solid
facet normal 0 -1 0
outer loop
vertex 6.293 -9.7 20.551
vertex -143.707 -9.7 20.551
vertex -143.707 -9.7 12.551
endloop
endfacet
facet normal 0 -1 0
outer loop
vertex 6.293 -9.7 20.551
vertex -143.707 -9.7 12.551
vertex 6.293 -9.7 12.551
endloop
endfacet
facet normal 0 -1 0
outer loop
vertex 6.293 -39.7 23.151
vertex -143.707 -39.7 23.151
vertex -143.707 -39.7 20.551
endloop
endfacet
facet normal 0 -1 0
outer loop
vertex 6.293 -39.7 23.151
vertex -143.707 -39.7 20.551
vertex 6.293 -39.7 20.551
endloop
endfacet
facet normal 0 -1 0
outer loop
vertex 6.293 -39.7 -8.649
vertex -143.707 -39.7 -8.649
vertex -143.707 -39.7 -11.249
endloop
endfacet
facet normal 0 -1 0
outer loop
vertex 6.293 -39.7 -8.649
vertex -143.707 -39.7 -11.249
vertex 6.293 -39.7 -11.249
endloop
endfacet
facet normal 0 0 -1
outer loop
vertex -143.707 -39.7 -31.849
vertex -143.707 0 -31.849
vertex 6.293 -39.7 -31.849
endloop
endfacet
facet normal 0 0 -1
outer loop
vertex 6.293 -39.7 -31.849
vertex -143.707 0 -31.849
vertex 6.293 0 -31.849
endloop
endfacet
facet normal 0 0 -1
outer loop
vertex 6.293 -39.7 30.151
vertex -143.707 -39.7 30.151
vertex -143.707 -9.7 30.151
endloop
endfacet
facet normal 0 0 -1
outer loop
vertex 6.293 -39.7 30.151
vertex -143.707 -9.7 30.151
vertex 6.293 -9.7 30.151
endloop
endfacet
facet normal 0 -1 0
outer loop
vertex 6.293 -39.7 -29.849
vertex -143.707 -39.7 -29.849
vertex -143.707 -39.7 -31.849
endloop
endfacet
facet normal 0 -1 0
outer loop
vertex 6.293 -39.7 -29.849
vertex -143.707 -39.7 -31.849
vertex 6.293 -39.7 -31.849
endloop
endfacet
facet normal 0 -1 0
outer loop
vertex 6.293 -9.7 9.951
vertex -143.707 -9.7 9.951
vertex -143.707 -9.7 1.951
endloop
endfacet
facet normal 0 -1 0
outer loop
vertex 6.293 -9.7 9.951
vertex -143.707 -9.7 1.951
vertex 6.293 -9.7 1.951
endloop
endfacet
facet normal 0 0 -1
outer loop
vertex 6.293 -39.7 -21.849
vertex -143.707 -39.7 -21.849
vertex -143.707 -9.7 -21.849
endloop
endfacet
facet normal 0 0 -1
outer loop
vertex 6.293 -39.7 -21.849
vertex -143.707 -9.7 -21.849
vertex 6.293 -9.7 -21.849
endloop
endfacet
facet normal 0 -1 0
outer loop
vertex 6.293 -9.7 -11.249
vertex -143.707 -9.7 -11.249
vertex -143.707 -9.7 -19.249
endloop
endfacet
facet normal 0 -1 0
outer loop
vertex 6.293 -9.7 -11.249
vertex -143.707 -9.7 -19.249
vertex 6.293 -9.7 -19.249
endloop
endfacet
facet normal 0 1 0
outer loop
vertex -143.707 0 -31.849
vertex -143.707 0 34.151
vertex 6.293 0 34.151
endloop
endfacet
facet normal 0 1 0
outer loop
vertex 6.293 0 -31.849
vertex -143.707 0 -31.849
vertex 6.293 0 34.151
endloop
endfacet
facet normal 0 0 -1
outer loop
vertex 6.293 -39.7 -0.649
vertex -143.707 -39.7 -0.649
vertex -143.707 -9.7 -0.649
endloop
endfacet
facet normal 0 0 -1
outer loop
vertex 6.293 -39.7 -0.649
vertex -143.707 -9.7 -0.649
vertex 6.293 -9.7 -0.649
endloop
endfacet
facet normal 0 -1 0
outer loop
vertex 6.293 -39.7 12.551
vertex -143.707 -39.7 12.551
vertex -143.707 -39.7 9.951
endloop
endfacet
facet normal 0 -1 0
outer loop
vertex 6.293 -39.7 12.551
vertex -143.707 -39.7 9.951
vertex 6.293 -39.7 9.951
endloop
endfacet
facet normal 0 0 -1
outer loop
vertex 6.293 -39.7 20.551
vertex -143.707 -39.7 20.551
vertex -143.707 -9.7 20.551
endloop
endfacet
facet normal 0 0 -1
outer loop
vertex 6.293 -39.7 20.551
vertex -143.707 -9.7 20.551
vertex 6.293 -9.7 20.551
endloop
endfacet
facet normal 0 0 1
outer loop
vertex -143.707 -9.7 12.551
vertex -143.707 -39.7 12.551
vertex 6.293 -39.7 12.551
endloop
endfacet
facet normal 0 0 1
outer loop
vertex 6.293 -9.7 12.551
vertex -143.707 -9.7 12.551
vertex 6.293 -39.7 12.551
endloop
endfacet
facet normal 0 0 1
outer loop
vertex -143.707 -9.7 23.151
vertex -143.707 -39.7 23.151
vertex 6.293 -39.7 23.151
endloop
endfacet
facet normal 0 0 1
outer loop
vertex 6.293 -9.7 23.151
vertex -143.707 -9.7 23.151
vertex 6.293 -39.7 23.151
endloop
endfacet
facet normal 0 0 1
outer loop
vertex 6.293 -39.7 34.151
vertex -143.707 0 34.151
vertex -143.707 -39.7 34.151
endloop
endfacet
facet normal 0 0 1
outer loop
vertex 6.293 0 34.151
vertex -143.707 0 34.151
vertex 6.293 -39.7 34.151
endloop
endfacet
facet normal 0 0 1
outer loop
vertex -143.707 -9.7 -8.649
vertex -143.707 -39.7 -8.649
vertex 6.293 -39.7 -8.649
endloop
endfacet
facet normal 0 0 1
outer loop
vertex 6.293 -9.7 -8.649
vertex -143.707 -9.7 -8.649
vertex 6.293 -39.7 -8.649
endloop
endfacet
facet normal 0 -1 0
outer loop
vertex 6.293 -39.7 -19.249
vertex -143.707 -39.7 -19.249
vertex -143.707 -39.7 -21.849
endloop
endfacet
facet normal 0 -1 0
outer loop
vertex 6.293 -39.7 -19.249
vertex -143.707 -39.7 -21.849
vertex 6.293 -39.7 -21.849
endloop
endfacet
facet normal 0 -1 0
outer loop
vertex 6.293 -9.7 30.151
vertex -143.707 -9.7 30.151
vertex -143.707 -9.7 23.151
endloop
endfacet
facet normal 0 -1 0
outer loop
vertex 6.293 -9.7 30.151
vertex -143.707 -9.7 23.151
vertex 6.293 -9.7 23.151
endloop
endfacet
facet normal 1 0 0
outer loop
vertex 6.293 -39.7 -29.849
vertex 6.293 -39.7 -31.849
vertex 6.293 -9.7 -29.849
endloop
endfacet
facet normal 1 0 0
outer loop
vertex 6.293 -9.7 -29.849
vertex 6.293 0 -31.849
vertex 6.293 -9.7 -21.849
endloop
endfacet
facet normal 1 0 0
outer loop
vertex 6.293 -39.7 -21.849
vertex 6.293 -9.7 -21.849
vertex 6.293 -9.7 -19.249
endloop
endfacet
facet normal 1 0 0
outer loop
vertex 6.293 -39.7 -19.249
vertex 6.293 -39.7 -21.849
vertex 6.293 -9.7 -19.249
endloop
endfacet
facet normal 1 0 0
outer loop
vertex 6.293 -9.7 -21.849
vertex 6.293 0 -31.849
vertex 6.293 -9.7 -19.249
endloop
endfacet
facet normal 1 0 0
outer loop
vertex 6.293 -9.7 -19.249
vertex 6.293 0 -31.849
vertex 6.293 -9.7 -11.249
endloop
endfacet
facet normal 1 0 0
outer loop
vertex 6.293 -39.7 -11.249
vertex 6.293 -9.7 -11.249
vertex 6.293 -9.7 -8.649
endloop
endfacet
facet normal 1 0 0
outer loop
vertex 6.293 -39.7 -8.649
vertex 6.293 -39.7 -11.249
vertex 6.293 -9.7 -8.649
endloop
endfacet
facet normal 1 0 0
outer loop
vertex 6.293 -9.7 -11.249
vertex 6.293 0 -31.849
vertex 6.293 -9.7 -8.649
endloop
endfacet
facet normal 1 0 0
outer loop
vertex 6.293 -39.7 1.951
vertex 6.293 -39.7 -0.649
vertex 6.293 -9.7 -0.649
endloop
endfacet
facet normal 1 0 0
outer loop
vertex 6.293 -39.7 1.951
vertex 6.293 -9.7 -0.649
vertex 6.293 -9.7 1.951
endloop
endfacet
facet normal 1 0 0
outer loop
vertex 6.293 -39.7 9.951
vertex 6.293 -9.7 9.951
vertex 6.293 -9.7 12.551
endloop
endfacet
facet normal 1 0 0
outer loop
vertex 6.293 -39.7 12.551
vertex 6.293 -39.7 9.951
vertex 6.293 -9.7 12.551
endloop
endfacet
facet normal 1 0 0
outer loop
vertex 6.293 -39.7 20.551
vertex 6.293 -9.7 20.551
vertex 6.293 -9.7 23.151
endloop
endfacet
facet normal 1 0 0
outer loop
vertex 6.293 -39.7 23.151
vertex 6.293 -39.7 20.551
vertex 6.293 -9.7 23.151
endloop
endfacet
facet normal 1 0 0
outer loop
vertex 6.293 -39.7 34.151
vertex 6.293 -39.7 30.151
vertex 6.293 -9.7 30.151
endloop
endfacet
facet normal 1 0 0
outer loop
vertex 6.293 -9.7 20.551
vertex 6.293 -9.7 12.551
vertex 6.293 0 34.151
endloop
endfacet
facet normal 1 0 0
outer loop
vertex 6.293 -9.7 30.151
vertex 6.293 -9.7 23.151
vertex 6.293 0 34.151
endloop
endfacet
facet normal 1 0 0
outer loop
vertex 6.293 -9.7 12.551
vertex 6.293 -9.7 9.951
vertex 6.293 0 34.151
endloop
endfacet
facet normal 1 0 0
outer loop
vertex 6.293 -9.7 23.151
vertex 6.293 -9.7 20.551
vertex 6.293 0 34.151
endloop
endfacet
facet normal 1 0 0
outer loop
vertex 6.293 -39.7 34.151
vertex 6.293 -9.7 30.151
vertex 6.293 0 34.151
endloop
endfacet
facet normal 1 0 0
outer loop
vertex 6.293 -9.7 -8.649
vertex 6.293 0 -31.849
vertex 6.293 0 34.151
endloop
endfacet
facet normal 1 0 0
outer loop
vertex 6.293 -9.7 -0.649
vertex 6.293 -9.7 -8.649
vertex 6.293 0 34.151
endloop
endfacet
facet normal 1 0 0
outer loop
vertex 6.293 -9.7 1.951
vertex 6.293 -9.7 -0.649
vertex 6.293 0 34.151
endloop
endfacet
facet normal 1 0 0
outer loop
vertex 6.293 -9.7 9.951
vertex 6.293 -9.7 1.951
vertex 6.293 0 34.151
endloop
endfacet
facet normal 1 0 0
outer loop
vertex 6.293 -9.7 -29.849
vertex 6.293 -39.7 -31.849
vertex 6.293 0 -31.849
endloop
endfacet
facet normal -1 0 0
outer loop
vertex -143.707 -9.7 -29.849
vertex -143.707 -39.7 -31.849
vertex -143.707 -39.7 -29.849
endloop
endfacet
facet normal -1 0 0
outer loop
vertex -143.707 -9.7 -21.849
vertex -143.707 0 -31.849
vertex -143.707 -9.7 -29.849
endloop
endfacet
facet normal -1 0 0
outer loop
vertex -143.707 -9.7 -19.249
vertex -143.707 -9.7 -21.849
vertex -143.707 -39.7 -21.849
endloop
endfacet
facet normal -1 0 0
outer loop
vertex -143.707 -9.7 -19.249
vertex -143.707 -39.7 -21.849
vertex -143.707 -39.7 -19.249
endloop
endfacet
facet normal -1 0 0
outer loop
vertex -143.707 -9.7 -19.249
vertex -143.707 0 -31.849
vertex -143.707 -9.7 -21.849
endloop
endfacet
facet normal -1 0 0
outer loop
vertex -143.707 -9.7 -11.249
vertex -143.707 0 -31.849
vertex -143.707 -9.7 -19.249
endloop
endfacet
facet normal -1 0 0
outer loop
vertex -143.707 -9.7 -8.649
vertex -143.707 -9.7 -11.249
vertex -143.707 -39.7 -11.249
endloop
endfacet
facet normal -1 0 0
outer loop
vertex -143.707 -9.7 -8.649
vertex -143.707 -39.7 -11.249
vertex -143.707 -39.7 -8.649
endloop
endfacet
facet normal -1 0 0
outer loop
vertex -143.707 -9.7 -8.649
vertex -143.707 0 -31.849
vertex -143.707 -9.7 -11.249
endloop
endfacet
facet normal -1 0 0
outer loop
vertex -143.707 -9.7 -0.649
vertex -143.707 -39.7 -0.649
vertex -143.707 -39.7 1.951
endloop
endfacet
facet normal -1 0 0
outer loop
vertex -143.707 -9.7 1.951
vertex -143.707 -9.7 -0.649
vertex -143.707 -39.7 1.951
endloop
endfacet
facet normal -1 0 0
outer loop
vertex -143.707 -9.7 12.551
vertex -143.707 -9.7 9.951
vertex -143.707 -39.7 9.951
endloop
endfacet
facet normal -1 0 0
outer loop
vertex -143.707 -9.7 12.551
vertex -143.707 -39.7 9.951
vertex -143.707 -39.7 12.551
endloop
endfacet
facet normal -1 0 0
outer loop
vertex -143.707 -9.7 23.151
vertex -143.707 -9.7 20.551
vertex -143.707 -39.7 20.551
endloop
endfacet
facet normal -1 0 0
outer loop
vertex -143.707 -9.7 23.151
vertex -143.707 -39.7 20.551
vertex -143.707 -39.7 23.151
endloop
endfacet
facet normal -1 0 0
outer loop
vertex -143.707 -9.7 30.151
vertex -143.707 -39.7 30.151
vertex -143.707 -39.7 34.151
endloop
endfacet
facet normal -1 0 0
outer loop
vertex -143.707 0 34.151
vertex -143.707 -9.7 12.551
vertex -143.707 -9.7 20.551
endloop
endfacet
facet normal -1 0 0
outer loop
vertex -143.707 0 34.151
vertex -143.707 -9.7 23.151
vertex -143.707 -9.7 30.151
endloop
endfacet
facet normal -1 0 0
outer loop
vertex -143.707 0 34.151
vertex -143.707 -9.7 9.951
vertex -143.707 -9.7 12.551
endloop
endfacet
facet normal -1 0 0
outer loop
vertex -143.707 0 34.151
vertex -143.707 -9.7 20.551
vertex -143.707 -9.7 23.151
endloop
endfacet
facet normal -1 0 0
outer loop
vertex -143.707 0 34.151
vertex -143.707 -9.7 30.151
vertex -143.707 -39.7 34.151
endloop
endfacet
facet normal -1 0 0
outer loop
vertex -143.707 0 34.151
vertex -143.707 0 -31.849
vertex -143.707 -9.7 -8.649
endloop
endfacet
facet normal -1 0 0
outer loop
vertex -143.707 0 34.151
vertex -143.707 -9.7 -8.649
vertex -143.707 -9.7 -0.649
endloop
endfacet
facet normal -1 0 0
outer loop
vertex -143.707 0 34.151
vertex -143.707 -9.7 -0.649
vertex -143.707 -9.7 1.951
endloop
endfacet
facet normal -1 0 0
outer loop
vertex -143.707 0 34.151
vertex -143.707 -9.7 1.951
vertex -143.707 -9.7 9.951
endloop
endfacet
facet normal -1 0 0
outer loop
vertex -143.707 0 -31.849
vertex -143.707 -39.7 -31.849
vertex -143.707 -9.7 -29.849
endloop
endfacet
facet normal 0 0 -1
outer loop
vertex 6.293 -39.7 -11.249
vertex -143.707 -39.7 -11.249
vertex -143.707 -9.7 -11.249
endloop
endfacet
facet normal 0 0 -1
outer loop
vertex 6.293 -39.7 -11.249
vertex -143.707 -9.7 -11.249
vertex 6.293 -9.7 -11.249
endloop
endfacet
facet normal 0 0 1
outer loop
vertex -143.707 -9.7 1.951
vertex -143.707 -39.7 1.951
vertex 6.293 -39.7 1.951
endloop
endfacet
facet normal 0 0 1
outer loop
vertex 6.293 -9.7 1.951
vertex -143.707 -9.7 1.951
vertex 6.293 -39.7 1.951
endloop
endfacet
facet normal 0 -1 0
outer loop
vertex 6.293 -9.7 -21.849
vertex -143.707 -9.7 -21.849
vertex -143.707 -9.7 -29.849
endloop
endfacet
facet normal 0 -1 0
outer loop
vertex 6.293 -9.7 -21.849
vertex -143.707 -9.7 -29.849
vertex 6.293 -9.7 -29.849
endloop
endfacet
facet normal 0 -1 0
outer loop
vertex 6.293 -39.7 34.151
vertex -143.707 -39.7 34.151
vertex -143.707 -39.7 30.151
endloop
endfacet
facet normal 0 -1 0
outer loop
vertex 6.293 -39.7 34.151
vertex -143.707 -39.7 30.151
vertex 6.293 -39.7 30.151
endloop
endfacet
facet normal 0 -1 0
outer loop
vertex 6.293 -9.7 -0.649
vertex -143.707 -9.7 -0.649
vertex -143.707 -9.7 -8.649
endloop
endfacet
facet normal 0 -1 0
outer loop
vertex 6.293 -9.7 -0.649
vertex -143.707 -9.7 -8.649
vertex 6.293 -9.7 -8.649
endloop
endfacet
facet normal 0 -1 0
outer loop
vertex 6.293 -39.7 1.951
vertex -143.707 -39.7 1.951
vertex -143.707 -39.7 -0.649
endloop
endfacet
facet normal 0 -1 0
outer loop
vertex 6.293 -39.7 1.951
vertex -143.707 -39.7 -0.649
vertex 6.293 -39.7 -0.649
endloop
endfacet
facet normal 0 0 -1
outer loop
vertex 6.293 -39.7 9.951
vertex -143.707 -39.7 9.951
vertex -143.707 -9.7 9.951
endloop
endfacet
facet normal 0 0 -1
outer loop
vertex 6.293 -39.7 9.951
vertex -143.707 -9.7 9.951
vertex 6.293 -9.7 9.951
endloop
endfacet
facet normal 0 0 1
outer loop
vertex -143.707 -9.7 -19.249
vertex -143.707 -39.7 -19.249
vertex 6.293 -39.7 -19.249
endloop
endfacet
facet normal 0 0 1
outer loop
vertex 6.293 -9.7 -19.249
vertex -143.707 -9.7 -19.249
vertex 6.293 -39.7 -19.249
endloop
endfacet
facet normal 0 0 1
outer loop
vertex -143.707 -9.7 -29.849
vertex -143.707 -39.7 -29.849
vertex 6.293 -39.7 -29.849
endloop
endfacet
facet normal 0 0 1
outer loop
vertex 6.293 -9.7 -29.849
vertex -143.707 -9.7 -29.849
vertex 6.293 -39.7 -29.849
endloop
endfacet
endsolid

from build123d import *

# Parameters (mm, degrees)
F0_W     = 150
F0_H     = 66
F1_DEPTH = 39.7
F2_W     = 150
F2_H     = 7
F3_DEPTH = 30
F2_H_2   = 8
F4_DEPTH = 30
F5_DEPTH = 30
F6_DEPTH = 30
F7_DEPTH = 30
F8_DEPTH = 30


with BuildPart() as f1:
    # F0 (on Front) → F1 (new body)
    with BuildSketch(Plane.XZ):
        with Locations((-68.706734, 1.151069)):
            Rectangle(F0_W, F0_H)
    extrude(amount=F1_DEPTH)

    # F2 (on face) → F3 (cut)
    with BuildSketch(Plane.XZ.offset(39.7)):
        with Locations((-68.706734, 26.651069)):
            Rectangle(F2_W, F2_H)
    extrude(amount=-F3_DEPTH, mode=Mode.SUBTRACT)

    # F2 (on face) → F4 (cut)
    with BuildSketch(Plane.XZ.offset(39.7)):
        with Locations((-68.706734, 16.551069)):
            Rectangle(F2_W, F2_H_2)
    extrude(amount=-F4_DEPTH, mode=Mode.SUBTRACT)

    # F2 (on face) → F5 (cut)
    with BuildSketch(Plane.XZ.offset(39.7)):
        with Locations((-68.706734, 5.951069)):
            Rectangle(F2_W, F2_H_2)
    extrude(amount=-F5_DEPTH, mode=Mode.SUBTRACT)

    # F2 (on face) → F6 (cut)
    with BuildSketch(Plane.XZ.offset(39.7)):
        with Locations((-68.706734, -4.648931)):
            Rectangle(F2_W, F2_H_2)
    extrude(amount=-F6_DEPTH, mode=Mode.SUBTRACT)

    # F2 (on face) → F7 (cut)
    with BuildSketch(Plane.XZ.offset(39.7)):
        with Locations((-68.706734, -15.248931)):
            Rectangle(F2_W, F2_H_2)
    extrude(amount=-F7_DEPTH, mode=Mode.SUBTRACT)

    # F2 (on face) → F8 (cut)
    with BuildSketch(Plane.XZ.offset(39.7)):
        with Locations((-68.706734, -25.848931)):
            Rectangle(F2_W, F2_H_2)
    extrude(amount=-F8_DEPTH, mode=Mode.SUBTRACT)


solid = f1.part
